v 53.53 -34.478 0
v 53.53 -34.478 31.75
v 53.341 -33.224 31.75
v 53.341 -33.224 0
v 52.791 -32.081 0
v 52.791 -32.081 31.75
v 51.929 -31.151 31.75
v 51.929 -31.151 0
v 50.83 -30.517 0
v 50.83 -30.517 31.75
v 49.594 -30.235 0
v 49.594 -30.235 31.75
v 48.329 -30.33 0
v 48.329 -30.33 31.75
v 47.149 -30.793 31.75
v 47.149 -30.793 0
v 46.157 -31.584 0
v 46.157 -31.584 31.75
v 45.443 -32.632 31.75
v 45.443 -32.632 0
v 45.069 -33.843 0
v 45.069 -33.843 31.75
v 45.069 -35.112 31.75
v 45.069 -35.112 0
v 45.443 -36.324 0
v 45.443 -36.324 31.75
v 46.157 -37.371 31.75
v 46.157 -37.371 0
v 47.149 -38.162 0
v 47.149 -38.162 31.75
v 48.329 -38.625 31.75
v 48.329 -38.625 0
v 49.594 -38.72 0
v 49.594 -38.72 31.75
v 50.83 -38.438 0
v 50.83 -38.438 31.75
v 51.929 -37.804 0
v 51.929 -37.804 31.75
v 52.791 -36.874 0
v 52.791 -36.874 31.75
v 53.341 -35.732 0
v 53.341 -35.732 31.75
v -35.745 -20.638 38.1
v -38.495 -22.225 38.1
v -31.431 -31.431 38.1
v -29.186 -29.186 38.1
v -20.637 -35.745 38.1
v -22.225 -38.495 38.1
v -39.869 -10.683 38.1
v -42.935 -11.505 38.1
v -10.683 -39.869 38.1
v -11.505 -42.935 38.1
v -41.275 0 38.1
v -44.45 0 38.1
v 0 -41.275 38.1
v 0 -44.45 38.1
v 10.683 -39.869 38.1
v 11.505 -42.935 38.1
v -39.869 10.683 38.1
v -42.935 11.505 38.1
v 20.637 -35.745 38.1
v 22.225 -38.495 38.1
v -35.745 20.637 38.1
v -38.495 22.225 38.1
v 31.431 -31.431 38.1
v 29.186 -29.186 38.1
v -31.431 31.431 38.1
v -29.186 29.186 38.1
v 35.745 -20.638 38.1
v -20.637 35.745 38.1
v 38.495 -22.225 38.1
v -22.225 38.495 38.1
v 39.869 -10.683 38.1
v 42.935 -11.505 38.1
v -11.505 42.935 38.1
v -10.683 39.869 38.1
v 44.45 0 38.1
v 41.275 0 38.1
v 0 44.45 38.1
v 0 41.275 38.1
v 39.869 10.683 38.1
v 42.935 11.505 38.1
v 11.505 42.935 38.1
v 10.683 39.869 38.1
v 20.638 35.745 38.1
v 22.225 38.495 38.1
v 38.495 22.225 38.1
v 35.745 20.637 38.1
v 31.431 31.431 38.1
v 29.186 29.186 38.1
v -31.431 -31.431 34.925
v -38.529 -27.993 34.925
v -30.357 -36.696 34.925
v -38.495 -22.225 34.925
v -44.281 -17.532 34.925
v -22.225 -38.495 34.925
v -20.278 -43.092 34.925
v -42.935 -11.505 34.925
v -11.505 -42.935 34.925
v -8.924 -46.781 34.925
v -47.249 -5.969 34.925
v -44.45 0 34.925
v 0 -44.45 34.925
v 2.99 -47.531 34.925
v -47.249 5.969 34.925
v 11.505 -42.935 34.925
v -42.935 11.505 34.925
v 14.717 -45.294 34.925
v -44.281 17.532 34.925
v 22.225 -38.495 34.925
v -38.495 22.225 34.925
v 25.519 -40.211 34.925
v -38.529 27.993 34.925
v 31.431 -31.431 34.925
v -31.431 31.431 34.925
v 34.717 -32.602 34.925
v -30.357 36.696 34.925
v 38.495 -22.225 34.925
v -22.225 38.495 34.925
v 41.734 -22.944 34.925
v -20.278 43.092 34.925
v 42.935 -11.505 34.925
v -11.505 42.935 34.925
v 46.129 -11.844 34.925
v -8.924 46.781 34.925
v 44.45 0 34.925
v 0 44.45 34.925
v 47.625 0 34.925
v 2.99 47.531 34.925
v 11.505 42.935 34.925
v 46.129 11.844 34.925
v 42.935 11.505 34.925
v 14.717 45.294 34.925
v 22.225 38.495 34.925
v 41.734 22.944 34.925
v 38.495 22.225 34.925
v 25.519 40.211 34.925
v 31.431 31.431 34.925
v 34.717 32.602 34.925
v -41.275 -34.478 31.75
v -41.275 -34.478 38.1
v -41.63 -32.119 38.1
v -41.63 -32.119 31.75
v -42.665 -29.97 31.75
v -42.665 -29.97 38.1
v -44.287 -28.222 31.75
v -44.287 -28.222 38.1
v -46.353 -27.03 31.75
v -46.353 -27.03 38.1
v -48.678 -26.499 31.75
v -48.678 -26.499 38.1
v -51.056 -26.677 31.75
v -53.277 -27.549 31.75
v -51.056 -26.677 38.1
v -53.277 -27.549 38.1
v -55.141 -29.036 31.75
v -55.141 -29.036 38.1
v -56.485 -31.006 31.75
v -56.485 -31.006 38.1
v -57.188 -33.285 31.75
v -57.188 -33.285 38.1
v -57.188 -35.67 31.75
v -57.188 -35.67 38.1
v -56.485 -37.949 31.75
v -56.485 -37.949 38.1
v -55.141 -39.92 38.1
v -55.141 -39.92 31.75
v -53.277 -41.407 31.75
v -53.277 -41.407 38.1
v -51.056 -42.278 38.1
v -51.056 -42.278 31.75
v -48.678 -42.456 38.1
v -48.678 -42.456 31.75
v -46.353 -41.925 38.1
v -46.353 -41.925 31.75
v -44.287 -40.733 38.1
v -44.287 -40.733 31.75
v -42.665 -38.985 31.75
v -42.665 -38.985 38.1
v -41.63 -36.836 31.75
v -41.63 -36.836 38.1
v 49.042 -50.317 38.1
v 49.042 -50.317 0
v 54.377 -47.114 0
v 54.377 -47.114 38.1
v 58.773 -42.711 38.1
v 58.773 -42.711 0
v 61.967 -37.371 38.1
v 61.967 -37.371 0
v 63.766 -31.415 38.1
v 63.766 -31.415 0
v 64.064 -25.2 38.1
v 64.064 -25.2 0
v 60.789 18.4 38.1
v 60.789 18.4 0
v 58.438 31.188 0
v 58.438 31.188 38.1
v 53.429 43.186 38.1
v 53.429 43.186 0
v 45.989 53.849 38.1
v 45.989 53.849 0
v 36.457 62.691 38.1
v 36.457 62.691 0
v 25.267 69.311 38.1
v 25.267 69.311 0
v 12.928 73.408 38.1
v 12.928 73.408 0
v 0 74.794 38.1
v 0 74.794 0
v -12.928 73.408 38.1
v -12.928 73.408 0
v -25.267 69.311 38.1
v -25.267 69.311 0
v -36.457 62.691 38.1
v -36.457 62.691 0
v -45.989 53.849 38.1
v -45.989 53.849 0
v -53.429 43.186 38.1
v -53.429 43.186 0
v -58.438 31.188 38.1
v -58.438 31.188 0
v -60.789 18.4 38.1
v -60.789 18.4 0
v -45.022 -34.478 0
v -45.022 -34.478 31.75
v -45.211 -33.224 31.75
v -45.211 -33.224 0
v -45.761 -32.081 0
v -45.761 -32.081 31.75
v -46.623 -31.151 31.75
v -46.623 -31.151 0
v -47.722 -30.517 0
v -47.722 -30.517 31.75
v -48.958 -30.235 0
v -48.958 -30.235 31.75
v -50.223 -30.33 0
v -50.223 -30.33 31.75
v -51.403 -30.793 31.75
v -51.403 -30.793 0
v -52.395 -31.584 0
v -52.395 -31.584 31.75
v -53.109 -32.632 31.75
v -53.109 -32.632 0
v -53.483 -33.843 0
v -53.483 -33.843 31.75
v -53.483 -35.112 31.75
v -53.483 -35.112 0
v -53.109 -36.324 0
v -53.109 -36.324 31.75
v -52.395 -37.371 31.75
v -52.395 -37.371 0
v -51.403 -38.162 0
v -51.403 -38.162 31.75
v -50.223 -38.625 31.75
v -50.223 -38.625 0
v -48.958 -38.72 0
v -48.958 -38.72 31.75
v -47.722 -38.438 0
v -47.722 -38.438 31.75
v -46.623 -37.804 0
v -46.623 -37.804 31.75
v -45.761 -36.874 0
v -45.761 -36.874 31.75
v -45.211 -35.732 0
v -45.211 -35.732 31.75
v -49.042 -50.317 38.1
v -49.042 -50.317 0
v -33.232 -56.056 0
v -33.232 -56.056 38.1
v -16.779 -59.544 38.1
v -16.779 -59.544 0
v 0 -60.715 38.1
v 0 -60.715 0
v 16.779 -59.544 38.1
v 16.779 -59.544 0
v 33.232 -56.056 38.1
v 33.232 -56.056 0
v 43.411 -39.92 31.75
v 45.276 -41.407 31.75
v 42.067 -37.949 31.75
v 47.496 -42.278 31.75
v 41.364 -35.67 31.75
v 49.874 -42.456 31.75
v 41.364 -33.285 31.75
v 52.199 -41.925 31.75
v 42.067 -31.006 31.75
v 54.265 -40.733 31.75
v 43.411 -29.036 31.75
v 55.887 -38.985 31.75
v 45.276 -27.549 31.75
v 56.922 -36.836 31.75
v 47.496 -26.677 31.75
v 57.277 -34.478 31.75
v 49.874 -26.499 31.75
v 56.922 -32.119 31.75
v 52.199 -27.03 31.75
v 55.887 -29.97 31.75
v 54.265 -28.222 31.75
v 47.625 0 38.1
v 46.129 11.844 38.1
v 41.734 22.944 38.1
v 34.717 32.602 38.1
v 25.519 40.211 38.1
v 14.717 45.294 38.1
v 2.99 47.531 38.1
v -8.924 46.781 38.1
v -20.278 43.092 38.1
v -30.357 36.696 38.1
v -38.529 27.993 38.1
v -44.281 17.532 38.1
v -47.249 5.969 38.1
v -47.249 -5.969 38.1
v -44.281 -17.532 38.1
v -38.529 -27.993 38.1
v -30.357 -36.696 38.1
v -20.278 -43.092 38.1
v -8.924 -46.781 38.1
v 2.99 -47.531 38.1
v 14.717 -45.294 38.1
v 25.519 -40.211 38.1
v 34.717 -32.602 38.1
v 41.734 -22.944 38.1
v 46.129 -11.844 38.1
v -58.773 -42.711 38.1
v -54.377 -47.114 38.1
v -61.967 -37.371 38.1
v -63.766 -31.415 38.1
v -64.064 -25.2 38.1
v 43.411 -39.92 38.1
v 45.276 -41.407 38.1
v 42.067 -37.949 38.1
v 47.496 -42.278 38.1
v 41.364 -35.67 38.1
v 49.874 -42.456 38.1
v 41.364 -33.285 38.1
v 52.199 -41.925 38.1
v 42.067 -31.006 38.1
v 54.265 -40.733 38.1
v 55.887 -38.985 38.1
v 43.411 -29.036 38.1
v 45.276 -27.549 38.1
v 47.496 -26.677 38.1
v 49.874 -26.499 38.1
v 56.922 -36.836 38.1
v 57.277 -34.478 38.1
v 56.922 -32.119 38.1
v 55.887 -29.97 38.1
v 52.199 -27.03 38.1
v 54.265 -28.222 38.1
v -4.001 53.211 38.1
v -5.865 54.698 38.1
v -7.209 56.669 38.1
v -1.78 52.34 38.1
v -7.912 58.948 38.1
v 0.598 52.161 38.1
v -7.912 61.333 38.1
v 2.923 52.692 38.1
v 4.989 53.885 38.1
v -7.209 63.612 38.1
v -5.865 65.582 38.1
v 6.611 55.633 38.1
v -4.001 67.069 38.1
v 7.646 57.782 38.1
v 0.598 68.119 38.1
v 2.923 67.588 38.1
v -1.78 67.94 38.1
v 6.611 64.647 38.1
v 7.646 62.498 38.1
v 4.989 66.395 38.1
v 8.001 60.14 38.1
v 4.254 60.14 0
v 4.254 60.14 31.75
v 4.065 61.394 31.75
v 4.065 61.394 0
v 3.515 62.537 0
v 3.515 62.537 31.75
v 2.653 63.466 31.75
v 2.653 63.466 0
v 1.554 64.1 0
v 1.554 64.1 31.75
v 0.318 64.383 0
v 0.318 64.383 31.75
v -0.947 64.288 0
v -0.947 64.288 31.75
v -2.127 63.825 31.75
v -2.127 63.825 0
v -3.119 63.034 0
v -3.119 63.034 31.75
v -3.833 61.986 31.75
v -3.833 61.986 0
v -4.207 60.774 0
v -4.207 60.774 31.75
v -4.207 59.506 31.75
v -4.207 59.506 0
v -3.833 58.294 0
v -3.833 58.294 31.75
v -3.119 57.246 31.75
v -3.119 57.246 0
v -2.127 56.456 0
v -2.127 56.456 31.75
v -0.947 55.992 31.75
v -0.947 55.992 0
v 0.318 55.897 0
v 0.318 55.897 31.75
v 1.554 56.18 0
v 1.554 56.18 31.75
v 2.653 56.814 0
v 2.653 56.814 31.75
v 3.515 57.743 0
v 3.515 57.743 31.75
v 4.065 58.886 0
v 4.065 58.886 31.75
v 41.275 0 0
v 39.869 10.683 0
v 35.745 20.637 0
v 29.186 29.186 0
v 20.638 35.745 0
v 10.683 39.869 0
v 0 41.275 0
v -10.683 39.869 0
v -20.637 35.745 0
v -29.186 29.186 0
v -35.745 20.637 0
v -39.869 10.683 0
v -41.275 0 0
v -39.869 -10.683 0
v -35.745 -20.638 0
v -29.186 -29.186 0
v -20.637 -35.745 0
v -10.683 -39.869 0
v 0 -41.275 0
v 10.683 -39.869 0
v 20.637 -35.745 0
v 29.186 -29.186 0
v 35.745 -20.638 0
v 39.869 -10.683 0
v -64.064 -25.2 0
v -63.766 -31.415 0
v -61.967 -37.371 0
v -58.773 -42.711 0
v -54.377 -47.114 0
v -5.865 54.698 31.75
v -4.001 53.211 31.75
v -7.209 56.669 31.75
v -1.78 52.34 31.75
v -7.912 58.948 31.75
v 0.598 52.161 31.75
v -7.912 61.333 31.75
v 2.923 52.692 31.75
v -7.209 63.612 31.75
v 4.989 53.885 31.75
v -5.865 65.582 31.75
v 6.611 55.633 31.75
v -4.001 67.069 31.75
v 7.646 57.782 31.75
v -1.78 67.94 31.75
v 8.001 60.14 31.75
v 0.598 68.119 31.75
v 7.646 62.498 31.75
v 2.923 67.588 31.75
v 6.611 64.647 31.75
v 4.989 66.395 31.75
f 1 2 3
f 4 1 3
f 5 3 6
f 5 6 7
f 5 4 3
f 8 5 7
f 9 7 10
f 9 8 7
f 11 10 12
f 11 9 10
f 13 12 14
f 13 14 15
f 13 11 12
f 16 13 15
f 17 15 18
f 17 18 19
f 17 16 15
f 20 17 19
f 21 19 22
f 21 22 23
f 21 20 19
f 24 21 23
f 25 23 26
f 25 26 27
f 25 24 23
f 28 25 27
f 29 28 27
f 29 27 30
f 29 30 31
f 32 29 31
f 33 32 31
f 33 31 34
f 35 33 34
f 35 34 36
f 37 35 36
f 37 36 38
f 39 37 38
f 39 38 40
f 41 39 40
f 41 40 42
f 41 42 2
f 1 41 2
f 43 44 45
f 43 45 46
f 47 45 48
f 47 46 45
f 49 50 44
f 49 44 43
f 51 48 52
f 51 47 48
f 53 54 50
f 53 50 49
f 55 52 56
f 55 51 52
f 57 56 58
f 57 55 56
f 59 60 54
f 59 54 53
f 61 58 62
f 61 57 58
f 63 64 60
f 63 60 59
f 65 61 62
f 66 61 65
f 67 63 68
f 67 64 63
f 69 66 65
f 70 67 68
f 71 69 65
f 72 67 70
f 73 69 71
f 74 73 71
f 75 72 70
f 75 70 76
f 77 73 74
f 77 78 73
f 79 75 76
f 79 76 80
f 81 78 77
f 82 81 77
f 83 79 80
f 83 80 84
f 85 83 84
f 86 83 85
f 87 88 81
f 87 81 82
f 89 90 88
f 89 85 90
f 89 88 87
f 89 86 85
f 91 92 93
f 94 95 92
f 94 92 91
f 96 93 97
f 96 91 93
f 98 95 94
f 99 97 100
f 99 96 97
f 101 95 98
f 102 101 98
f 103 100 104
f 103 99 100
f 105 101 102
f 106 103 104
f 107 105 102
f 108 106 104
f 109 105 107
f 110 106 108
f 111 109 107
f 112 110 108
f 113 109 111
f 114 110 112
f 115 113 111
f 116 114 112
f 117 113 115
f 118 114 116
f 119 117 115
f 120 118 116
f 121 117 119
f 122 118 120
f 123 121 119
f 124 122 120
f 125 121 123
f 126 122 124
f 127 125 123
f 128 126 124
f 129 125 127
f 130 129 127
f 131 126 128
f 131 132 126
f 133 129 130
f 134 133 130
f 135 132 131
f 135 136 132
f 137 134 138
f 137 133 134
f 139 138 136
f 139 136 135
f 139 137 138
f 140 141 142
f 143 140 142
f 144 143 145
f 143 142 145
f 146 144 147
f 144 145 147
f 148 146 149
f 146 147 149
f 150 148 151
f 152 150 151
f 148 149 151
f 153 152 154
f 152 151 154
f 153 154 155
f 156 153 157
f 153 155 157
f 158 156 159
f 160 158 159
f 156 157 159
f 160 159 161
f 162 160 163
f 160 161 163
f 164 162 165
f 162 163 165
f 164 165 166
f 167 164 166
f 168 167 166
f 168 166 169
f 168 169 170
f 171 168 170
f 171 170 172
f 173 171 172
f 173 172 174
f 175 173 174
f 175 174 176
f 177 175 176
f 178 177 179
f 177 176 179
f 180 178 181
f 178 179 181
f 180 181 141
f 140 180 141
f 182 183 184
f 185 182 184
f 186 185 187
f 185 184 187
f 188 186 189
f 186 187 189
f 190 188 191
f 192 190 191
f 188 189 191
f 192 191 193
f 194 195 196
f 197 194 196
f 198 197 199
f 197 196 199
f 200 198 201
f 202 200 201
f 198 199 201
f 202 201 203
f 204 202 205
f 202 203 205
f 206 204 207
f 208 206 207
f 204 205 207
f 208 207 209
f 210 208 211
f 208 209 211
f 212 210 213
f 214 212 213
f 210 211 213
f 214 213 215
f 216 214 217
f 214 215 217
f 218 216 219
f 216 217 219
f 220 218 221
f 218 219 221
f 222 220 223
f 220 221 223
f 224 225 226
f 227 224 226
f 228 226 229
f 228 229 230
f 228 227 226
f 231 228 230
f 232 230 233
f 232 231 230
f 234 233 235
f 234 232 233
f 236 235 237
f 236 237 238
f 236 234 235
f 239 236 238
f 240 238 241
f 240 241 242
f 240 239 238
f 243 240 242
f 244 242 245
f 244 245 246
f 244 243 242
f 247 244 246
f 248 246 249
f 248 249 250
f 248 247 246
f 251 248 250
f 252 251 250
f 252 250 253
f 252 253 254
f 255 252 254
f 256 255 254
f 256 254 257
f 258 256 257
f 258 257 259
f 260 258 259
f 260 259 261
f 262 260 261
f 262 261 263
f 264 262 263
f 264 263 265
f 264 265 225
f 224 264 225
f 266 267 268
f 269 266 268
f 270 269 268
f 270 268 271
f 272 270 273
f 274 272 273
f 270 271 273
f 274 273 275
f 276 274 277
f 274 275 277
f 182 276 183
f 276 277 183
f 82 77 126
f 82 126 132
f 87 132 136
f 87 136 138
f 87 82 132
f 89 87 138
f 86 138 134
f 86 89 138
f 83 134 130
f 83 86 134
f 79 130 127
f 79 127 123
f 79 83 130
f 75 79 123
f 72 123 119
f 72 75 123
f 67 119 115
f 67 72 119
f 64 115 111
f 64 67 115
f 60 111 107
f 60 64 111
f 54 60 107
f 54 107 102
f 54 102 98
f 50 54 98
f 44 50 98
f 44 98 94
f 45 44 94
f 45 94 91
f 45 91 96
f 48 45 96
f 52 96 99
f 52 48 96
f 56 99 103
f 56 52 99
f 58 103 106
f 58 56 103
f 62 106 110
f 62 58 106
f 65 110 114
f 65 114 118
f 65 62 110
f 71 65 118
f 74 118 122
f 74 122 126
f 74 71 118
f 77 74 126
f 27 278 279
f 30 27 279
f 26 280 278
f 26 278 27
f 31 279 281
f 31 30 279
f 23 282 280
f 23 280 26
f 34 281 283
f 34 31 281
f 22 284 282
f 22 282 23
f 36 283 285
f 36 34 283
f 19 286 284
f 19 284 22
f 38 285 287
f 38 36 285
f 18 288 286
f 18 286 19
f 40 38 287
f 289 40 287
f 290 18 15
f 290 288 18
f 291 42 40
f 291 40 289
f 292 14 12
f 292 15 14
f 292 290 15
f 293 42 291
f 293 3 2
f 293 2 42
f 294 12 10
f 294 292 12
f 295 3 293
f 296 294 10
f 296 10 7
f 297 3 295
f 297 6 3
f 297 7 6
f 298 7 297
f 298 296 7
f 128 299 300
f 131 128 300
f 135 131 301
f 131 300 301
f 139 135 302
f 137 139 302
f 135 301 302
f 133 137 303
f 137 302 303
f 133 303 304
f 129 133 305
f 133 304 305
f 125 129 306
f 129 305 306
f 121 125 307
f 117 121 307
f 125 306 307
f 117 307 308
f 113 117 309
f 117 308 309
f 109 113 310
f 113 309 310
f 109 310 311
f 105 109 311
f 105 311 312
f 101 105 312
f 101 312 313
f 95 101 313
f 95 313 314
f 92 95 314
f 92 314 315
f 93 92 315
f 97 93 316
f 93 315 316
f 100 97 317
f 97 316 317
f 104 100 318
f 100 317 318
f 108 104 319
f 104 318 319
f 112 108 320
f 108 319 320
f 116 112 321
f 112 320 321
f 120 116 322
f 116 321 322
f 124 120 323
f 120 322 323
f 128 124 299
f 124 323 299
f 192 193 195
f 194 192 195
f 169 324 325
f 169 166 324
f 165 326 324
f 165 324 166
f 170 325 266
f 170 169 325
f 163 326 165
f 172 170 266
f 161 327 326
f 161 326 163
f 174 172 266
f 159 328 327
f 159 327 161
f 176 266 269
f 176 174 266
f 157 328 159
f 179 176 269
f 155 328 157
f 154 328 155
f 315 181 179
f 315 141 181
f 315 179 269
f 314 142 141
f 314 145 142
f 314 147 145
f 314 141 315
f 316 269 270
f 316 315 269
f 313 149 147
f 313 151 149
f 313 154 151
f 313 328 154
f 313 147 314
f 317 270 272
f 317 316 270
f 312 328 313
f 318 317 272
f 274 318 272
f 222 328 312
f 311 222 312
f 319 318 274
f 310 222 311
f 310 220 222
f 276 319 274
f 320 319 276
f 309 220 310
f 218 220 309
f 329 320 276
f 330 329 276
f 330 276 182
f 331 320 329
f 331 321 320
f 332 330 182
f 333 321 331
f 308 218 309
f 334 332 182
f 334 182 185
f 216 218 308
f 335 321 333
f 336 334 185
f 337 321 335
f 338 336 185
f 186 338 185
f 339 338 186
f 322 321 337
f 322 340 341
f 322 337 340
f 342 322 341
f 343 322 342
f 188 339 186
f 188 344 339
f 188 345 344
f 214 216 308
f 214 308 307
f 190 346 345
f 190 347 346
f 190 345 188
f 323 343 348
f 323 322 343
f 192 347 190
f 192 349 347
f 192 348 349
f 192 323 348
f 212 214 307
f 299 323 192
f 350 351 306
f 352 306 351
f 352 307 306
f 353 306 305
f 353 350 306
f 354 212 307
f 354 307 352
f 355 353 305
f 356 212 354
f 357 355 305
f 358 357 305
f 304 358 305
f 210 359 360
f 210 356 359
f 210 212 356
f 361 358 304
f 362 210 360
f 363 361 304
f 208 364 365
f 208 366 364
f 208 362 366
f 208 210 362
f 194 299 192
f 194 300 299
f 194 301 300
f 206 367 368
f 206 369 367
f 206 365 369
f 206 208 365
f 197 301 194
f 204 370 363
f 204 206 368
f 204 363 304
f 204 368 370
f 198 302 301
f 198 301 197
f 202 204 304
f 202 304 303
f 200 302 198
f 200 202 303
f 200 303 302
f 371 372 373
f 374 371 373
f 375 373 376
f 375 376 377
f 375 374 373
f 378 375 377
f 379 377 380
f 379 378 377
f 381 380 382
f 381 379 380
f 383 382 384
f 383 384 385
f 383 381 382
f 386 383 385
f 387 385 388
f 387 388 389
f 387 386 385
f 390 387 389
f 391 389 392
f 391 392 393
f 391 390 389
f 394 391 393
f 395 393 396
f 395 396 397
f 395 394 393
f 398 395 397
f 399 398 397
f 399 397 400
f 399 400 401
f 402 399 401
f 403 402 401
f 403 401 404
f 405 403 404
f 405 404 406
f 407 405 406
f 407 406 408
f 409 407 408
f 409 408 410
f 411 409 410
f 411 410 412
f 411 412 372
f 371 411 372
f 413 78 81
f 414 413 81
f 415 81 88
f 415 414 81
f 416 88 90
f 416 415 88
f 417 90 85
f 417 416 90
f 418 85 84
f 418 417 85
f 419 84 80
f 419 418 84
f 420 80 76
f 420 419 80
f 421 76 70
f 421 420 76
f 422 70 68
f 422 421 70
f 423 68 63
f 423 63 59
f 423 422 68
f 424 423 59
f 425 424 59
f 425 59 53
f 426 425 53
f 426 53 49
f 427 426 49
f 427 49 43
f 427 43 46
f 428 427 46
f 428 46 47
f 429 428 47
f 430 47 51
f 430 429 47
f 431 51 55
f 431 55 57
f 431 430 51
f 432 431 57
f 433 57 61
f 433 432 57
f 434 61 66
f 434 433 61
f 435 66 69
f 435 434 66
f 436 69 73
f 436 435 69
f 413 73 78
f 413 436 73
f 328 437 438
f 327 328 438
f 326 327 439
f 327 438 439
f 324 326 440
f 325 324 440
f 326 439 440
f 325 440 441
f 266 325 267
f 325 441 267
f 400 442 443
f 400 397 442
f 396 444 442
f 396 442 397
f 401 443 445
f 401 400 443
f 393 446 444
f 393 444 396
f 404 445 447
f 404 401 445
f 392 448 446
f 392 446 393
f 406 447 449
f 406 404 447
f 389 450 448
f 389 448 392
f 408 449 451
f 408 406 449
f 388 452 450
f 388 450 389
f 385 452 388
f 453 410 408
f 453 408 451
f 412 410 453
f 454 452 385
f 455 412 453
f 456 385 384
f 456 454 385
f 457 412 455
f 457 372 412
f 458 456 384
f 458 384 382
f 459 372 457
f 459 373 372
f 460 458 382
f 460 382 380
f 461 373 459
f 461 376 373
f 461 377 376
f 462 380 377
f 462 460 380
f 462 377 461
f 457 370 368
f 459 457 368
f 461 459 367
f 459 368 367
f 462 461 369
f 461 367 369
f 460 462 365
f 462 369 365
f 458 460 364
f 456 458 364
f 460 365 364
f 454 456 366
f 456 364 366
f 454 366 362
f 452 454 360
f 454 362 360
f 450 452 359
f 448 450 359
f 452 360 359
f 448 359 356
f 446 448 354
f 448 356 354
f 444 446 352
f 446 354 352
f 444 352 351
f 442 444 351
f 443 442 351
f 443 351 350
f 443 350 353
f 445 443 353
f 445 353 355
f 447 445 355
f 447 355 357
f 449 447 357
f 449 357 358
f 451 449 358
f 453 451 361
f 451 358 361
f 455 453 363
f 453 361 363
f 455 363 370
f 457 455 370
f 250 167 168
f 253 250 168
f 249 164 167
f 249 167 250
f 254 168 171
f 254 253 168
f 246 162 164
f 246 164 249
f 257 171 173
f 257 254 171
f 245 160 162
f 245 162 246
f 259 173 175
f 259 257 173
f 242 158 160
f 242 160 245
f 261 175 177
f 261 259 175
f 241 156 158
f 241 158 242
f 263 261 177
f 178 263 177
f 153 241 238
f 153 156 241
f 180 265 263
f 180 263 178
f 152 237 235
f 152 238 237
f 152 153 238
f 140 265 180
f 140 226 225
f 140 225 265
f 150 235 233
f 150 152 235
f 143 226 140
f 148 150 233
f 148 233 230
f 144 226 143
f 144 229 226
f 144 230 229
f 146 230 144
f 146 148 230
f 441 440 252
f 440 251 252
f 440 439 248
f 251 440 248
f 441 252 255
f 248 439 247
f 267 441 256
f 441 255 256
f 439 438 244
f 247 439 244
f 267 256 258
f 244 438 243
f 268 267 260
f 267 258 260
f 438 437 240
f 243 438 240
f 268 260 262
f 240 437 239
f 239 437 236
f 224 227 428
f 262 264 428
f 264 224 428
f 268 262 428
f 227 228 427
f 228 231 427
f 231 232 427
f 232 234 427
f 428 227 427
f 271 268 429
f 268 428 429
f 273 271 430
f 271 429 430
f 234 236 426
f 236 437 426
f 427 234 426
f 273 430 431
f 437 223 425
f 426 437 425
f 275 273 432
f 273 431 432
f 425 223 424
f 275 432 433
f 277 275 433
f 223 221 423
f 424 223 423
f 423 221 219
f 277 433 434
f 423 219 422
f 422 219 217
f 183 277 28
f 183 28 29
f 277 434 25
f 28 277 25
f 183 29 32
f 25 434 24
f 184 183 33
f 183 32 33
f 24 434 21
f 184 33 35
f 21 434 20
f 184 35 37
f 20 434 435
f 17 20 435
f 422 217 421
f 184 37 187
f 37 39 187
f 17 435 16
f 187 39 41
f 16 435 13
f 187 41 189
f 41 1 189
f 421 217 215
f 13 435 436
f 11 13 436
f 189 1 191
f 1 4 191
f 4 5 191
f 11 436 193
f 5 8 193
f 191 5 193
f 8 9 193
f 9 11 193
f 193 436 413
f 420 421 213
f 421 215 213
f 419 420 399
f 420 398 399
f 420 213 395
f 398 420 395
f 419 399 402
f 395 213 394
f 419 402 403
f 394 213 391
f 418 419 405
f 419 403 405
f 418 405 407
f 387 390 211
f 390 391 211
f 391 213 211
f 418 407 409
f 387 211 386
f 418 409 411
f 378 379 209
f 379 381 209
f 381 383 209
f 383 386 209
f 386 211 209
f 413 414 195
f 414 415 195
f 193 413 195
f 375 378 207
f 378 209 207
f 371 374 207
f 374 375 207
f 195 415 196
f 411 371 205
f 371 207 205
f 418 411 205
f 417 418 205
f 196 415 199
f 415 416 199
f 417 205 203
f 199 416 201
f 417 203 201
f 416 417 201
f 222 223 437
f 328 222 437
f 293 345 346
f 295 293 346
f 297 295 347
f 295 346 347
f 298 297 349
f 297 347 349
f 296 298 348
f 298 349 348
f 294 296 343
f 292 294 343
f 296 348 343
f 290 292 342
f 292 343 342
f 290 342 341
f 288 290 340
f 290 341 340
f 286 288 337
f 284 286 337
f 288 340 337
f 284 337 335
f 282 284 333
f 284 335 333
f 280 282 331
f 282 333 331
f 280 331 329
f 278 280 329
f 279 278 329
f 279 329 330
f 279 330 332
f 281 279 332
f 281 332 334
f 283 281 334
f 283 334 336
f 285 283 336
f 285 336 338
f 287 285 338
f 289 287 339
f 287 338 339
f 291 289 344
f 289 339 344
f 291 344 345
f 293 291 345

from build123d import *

# Parameters (mm, degrees)
F0_R     = 4.2545
F0_R_2   = 41.275
F1_DEPTH = 38.1
F2_R     = 8.001
F2_R_2   = 4.2545
F3_DEPTH = 6.35
F2_R_3   = 47.625
F2_R_4   = 44.45
F4_DEPTH = 3.175


with BuildPart() as f1:
    # F0 (on Top) → F1 (new body)
    with BuildSketch(Plane.XY):
        with BuildLine():
            Line((64.06365, -25.199729), (60.788761, 18.400254))
            ThreePointArc((60.788761, 18.400254), (0, 74.794278), (-60.788761, 18.400254))
            Line((-60.788761, 18.400254), (-64.06365, -25.199729))
            ThreePointArc((-64.06365, -25.199729), (-60.533997, -40.139233), (-49.042173, -50.316916))
            ThreePointArc((-49.042173, -50.316916), (0, -60.714722), (49.042173, -50.316916))
            ThreePointArc((49.042173, -50.316916), (60.533997, -40.139233), (64.06365, -25.199729))
        make_face()
        with Locations((-49.276, -34.477577)):
            Circle(F0_R, mode=Mode.SUBTRACT)
        with Locations((49.276, -34.477577)):
            Circle(F0_R, mode=Mode.SUBTRACT)
        Circle(F0_R_2, mode=Mode.SUBTRACT)
        with Locations((0, 60.140065)):
            Circle(F0_R, mode=Mode.SUBTRACT)
    extrude(amount=F1_DEPTH)

    # F2 (on face) → F3 (cut)
    with BuildSketch(Plane.XY.offset(38.1)):
        with Locations((0, 60.140065)):
            Circle(F2_R)
        with Locations((0, 60.140065)):
            Circle(F2_R_2, mode=Mode.SUBTRACT)
        with Locations((-49.276, -34.477577)):
            Circle(F2_R)
        with Locations((-49.276, -34.477577)):
            Circle(F2_R_2, mode=Mode.SUBTRACT)
        with Locations((49.276, -34.477577)):
            Circle(F2_R)
        with Locations((49.276, -34.477577)):
            Circle(F2_R_2, mode=Mode.SUBTRACT)
    extrude(amount=-F3_DEPTH, mode=Mode.SUBTRACT)

    # F2 (on face) → F4 (cut)
    with BuildSketch(Plane.XY.offset(38.1)):
        Circle(F2_R_3)
        Circle(F2_R_4, mode=Mode.SUBTRACT)
    extrude(amount=-F4_DEPTH, mode=Mode.SUBTRACT)


solid = f1.part
